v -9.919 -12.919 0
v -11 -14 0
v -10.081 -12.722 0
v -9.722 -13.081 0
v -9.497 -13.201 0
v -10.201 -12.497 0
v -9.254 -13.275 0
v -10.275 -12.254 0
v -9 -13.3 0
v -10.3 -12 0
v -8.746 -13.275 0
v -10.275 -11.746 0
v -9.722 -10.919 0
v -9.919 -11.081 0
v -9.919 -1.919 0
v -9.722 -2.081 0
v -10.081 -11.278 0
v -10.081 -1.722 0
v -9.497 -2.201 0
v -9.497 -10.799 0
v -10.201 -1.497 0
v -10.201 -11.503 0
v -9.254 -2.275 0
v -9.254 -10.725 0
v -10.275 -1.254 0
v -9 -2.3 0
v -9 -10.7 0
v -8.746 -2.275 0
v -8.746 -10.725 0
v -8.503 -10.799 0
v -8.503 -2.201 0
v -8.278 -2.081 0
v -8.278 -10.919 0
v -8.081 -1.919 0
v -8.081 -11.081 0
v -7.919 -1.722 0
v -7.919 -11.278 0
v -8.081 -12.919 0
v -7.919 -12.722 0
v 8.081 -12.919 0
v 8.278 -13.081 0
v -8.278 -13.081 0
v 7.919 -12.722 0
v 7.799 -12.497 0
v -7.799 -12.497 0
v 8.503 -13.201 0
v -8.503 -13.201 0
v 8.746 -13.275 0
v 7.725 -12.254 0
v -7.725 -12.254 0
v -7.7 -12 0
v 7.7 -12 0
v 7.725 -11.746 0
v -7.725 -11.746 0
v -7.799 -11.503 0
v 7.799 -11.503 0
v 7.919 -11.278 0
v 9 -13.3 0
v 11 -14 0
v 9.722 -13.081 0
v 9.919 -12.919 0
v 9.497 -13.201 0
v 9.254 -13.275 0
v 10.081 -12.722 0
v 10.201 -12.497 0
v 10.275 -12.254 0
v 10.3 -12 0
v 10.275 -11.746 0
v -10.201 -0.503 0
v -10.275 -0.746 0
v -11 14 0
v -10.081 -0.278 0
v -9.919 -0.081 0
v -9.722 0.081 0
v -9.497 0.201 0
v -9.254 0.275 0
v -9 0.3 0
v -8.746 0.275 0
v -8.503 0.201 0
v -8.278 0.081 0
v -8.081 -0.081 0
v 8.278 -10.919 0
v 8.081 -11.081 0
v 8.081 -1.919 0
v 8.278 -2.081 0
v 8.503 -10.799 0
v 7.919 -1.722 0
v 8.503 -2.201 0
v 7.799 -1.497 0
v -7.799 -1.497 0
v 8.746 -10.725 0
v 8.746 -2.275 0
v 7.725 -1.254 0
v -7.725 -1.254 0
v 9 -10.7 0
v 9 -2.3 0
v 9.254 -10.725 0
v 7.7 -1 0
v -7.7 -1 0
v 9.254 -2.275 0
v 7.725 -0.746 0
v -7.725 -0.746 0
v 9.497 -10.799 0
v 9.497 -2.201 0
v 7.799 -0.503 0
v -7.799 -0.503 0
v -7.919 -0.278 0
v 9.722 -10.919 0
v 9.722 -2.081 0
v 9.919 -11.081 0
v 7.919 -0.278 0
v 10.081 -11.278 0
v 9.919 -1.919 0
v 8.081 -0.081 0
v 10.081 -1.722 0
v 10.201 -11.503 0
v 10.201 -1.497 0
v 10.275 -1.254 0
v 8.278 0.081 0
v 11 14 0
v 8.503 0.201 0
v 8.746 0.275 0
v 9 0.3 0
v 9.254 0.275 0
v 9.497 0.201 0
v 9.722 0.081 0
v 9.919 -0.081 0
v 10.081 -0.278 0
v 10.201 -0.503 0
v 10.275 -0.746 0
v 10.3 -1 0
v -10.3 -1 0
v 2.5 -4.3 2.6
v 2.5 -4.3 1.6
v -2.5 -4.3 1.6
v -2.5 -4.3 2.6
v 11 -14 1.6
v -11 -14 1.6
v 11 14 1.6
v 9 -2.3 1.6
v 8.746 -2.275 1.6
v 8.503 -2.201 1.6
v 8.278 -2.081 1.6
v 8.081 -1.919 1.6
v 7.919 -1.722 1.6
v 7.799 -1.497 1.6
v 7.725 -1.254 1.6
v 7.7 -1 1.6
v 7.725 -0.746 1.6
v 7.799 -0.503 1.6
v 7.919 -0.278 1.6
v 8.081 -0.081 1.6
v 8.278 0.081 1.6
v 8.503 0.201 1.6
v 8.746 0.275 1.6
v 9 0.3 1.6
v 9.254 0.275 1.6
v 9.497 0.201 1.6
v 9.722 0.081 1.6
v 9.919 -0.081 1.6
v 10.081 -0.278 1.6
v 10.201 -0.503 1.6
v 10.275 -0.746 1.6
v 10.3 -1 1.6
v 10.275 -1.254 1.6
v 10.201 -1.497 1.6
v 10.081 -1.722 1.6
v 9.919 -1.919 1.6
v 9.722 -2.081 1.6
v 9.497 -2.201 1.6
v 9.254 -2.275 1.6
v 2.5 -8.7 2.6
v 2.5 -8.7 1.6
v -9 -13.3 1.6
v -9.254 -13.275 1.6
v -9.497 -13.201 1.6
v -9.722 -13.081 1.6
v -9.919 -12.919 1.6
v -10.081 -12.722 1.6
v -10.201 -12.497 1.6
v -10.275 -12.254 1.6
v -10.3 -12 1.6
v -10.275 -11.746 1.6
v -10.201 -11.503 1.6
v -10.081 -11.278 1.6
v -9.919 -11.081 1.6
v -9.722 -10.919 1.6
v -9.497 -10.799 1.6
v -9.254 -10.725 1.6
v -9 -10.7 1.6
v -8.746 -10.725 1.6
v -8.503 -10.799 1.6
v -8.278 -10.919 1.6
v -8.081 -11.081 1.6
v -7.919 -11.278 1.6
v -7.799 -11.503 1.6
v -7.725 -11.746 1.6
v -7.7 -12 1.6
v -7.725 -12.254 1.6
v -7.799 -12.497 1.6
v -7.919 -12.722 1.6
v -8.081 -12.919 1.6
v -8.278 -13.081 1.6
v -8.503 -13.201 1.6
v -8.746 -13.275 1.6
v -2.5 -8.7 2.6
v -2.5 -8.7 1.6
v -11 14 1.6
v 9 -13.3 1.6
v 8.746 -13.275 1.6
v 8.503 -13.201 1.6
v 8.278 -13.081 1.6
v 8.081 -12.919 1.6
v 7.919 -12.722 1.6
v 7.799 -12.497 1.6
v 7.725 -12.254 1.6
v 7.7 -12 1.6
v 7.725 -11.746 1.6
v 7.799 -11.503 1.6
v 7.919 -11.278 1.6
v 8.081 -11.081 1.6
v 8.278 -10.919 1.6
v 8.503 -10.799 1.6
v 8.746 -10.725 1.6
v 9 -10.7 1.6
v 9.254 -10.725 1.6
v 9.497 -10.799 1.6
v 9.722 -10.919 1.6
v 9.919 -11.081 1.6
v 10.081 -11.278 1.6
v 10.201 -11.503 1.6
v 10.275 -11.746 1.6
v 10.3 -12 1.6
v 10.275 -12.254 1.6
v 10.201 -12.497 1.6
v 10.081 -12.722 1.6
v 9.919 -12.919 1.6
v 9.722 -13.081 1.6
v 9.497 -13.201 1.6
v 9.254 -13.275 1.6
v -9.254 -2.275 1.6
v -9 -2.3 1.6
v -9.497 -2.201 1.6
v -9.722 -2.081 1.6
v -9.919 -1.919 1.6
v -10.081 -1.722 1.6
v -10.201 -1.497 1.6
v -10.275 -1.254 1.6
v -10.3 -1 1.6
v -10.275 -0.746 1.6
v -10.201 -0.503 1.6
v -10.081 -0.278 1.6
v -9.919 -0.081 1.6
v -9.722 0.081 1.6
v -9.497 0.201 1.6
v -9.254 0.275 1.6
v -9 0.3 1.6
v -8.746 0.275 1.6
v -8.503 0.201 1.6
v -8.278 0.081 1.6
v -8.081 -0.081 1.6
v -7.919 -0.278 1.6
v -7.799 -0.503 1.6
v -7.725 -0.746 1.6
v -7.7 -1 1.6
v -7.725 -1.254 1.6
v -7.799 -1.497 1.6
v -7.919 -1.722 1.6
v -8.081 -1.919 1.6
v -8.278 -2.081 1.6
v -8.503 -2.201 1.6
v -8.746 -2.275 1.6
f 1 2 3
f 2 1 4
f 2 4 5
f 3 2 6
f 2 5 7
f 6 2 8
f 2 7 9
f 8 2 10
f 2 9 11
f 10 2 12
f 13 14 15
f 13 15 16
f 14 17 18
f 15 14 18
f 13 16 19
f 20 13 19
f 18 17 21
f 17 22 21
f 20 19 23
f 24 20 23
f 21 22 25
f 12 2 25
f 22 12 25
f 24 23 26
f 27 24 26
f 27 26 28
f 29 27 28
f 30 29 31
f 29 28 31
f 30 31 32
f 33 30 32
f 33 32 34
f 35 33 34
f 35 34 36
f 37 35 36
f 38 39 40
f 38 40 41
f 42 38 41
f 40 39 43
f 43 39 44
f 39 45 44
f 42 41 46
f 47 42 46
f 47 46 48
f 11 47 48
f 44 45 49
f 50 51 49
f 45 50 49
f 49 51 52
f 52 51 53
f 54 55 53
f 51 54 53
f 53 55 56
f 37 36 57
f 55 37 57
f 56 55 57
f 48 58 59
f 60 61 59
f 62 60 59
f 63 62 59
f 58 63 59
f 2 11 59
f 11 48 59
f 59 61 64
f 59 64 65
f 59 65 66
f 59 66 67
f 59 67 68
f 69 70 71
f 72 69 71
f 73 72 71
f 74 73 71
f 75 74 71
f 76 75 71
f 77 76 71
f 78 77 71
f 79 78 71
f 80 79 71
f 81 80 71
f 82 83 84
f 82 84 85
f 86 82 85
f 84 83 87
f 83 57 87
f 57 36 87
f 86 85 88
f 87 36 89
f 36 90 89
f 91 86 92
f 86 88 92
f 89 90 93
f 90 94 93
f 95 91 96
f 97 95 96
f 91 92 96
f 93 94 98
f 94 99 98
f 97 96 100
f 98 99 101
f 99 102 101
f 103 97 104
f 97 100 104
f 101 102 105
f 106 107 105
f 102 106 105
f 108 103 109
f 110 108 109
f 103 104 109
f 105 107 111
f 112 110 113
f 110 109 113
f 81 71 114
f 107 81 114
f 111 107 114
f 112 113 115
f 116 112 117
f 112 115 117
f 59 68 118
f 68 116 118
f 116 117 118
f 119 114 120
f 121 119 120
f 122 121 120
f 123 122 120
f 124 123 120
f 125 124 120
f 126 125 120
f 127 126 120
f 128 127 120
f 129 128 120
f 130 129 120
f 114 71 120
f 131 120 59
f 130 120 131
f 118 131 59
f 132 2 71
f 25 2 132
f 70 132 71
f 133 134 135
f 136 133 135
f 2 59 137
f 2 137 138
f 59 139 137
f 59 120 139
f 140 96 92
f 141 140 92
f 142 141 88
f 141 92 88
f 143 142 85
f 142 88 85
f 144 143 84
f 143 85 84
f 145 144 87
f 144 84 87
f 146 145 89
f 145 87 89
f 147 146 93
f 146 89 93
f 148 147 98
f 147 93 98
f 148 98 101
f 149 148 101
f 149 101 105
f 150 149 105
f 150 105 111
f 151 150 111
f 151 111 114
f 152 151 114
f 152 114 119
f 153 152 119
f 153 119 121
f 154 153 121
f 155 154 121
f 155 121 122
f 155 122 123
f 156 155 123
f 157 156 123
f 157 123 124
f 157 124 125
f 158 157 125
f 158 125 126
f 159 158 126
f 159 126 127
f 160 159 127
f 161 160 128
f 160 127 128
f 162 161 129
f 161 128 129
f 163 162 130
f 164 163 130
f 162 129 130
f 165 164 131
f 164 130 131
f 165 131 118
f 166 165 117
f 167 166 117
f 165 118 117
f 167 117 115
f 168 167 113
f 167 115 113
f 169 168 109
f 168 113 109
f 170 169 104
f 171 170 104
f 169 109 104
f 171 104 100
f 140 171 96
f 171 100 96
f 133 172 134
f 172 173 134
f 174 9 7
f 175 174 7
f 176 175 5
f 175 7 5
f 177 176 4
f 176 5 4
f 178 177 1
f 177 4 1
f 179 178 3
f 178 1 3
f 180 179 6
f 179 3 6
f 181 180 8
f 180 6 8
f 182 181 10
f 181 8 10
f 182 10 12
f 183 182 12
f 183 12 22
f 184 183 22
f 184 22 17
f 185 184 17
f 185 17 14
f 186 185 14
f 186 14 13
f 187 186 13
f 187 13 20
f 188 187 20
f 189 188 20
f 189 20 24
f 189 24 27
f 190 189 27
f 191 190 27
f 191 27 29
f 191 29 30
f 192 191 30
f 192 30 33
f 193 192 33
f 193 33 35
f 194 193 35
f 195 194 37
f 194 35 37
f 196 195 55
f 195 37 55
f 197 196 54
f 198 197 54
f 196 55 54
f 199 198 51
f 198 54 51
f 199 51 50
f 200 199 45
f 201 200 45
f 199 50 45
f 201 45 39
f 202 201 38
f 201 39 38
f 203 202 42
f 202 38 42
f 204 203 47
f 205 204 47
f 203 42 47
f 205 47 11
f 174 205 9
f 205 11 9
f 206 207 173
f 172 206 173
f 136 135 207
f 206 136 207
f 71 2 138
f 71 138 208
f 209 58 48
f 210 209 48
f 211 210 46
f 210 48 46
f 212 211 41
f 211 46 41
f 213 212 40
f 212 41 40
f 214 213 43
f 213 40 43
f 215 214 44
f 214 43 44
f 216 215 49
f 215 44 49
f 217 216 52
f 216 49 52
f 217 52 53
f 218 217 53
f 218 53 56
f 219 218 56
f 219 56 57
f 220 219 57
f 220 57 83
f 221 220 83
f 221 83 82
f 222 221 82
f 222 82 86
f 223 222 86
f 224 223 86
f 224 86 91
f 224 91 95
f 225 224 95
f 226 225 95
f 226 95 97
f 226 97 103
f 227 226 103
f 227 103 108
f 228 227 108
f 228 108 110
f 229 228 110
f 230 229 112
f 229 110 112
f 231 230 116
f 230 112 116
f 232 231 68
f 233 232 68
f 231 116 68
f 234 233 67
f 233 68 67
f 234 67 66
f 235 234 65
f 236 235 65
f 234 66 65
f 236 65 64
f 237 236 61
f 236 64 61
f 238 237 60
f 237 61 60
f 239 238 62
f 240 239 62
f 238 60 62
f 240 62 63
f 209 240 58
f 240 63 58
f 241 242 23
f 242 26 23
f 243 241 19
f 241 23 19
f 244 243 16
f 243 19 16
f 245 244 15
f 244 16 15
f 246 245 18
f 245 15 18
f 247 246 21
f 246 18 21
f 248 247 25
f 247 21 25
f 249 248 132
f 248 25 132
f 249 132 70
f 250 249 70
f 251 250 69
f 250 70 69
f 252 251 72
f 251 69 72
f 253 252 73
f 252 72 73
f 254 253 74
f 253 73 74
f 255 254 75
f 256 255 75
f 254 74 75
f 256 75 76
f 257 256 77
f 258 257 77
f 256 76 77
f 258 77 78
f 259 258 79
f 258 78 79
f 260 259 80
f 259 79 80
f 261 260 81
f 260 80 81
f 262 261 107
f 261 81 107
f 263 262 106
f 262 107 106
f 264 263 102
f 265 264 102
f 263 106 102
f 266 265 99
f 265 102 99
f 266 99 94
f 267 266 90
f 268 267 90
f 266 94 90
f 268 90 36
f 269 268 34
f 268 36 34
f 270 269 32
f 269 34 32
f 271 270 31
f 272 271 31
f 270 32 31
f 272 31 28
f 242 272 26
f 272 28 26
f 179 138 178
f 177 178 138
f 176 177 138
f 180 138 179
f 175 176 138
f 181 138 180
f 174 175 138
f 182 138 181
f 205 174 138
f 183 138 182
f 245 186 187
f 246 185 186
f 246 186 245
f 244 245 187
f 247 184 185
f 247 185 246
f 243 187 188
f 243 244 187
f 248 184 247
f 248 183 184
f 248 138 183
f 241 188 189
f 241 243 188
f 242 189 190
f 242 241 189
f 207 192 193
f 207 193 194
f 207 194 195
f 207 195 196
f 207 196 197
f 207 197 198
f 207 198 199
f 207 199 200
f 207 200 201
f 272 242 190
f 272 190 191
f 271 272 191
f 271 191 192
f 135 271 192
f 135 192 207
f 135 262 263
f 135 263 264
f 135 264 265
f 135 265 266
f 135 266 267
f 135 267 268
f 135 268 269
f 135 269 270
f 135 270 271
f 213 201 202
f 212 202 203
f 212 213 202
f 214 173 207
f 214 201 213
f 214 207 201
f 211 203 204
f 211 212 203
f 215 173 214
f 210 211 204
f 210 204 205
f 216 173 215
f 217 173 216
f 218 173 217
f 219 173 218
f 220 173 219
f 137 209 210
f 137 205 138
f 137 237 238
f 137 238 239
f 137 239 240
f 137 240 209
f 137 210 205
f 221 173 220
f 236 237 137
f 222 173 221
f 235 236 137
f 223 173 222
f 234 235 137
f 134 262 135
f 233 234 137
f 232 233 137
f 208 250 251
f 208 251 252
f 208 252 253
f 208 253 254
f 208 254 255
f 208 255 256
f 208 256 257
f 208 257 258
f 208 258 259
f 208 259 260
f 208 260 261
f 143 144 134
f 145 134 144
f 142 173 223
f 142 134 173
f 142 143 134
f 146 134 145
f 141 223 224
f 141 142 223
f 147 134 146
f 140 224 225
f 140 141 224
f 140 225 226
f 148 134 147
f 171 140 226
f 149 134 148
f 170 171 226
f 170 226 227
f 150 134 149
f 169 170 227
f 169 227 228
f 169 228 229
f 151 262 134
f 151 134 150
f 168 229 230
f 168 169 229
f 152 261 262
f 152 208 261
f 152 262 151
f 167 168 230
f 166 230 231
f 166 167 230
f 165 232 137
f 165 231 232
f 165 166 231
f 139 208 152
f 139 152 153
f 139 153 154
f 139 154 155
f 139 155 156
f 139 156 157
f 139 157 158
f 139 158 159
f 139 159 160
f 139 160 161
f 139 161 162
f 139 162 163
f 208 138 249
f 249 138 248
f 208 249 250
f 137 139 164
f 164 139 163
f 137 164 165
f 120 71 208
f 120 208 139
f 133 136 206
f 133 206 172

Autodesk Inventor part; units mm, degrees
ref_plane "YZ Plane" through (0, 0, 0) normal (1, 0, 0) x (0, 1, 0)
ref_plane "XZ Plane" through (0, 0, 0) normal (0, 1, 0) x (-1, 0, 0)
ref_plane "XY Plane" through (0, 0, 0) normal (0, 0, 1) x (1, 0, 0)
sketch "Sketch1" plane through (0, 0, 0) normal (0, 0, 1) x (1, 0, 0)
  line L0 (-11, 14) -> (11, 14)
  line L1 (11, 14) -> (11, -14)
  line L2 (11, -14) -> (-11, -14)
  line L3 (-11, -14) -> (-11, 14)
  line L4 (-11, 14) -> (11, -14) construction
  line L5 (11, 14) -> (-11, -14) construction
  point P0 (0, 0)
  dimension "d0" = 22
  dimension "d1" = 28
extrude "Extrusion1" add sketch "Sketch1" along normal blind 1.6
sketch "Sketch2" plane through (0, 0, 1.6) normal (0, 0, 1) x (1, 0, 0)
  line L0 (-9, -12) -> (9, -12)
  line L1 (9, -12) -> (9, -1)
  line L2 (9, -1) -> (-9, -1)
  line L3 (-9, -1) -> (-9, -12)
  line L4 (-9, -12) -> (9, -1) construction
  line L5 (9, -12) -> (-9, -1) construction
  line L6 (0, 19.6) -> (0, -19.6) projected
  line L7 (-11, -14) -> (11, -14) projected
  point P0 (0, 0)
  point P1 (0, -6.5)
  dimension "d4" = 11
  dimension "d5" = 18
  dimension "d6" = 2
hole "Hole1" at (-9, -1, 1.6) at (9, -1, 1.6) at (9, -12, 1.6) at (-9, -12, 1.6) direction (0, 0, -1) diameter 2.6 end through all
sketch "Sketch3" plane through (0, 0, 1.6) normal (0, 0, 1) x (1, 0, 0)
  line L0 (-2.5, -8.7) -> (2.5, -8.7)
  line L1 (2.5, -8.7) -> (2.5, -4.3)
  line L2 (2.5, -4.3) -> (-2.5, -4.3)
  line L3 (-2.5, -4.3) -> (-2.5, -8.7)
  line L4 (-2.5, -8.7) -> (2.5, -4.3) construction
  line L5 (2.5, -8.7) -> (-2.5, -4.3) construction
  circle A0 centre (9, -1) radius 1.3 projected
  point P0 (0, 0)
  point P1 (0, -6.5)
  dimension "d14" = 5
  dimension "d15" = 4.4
  dimension "d16" = 5.5
extrude "Extrusion2" add sketch "Sketch3" along normal blind 1 contours L3 L2 L1 L0
properties part number "AS5047"
